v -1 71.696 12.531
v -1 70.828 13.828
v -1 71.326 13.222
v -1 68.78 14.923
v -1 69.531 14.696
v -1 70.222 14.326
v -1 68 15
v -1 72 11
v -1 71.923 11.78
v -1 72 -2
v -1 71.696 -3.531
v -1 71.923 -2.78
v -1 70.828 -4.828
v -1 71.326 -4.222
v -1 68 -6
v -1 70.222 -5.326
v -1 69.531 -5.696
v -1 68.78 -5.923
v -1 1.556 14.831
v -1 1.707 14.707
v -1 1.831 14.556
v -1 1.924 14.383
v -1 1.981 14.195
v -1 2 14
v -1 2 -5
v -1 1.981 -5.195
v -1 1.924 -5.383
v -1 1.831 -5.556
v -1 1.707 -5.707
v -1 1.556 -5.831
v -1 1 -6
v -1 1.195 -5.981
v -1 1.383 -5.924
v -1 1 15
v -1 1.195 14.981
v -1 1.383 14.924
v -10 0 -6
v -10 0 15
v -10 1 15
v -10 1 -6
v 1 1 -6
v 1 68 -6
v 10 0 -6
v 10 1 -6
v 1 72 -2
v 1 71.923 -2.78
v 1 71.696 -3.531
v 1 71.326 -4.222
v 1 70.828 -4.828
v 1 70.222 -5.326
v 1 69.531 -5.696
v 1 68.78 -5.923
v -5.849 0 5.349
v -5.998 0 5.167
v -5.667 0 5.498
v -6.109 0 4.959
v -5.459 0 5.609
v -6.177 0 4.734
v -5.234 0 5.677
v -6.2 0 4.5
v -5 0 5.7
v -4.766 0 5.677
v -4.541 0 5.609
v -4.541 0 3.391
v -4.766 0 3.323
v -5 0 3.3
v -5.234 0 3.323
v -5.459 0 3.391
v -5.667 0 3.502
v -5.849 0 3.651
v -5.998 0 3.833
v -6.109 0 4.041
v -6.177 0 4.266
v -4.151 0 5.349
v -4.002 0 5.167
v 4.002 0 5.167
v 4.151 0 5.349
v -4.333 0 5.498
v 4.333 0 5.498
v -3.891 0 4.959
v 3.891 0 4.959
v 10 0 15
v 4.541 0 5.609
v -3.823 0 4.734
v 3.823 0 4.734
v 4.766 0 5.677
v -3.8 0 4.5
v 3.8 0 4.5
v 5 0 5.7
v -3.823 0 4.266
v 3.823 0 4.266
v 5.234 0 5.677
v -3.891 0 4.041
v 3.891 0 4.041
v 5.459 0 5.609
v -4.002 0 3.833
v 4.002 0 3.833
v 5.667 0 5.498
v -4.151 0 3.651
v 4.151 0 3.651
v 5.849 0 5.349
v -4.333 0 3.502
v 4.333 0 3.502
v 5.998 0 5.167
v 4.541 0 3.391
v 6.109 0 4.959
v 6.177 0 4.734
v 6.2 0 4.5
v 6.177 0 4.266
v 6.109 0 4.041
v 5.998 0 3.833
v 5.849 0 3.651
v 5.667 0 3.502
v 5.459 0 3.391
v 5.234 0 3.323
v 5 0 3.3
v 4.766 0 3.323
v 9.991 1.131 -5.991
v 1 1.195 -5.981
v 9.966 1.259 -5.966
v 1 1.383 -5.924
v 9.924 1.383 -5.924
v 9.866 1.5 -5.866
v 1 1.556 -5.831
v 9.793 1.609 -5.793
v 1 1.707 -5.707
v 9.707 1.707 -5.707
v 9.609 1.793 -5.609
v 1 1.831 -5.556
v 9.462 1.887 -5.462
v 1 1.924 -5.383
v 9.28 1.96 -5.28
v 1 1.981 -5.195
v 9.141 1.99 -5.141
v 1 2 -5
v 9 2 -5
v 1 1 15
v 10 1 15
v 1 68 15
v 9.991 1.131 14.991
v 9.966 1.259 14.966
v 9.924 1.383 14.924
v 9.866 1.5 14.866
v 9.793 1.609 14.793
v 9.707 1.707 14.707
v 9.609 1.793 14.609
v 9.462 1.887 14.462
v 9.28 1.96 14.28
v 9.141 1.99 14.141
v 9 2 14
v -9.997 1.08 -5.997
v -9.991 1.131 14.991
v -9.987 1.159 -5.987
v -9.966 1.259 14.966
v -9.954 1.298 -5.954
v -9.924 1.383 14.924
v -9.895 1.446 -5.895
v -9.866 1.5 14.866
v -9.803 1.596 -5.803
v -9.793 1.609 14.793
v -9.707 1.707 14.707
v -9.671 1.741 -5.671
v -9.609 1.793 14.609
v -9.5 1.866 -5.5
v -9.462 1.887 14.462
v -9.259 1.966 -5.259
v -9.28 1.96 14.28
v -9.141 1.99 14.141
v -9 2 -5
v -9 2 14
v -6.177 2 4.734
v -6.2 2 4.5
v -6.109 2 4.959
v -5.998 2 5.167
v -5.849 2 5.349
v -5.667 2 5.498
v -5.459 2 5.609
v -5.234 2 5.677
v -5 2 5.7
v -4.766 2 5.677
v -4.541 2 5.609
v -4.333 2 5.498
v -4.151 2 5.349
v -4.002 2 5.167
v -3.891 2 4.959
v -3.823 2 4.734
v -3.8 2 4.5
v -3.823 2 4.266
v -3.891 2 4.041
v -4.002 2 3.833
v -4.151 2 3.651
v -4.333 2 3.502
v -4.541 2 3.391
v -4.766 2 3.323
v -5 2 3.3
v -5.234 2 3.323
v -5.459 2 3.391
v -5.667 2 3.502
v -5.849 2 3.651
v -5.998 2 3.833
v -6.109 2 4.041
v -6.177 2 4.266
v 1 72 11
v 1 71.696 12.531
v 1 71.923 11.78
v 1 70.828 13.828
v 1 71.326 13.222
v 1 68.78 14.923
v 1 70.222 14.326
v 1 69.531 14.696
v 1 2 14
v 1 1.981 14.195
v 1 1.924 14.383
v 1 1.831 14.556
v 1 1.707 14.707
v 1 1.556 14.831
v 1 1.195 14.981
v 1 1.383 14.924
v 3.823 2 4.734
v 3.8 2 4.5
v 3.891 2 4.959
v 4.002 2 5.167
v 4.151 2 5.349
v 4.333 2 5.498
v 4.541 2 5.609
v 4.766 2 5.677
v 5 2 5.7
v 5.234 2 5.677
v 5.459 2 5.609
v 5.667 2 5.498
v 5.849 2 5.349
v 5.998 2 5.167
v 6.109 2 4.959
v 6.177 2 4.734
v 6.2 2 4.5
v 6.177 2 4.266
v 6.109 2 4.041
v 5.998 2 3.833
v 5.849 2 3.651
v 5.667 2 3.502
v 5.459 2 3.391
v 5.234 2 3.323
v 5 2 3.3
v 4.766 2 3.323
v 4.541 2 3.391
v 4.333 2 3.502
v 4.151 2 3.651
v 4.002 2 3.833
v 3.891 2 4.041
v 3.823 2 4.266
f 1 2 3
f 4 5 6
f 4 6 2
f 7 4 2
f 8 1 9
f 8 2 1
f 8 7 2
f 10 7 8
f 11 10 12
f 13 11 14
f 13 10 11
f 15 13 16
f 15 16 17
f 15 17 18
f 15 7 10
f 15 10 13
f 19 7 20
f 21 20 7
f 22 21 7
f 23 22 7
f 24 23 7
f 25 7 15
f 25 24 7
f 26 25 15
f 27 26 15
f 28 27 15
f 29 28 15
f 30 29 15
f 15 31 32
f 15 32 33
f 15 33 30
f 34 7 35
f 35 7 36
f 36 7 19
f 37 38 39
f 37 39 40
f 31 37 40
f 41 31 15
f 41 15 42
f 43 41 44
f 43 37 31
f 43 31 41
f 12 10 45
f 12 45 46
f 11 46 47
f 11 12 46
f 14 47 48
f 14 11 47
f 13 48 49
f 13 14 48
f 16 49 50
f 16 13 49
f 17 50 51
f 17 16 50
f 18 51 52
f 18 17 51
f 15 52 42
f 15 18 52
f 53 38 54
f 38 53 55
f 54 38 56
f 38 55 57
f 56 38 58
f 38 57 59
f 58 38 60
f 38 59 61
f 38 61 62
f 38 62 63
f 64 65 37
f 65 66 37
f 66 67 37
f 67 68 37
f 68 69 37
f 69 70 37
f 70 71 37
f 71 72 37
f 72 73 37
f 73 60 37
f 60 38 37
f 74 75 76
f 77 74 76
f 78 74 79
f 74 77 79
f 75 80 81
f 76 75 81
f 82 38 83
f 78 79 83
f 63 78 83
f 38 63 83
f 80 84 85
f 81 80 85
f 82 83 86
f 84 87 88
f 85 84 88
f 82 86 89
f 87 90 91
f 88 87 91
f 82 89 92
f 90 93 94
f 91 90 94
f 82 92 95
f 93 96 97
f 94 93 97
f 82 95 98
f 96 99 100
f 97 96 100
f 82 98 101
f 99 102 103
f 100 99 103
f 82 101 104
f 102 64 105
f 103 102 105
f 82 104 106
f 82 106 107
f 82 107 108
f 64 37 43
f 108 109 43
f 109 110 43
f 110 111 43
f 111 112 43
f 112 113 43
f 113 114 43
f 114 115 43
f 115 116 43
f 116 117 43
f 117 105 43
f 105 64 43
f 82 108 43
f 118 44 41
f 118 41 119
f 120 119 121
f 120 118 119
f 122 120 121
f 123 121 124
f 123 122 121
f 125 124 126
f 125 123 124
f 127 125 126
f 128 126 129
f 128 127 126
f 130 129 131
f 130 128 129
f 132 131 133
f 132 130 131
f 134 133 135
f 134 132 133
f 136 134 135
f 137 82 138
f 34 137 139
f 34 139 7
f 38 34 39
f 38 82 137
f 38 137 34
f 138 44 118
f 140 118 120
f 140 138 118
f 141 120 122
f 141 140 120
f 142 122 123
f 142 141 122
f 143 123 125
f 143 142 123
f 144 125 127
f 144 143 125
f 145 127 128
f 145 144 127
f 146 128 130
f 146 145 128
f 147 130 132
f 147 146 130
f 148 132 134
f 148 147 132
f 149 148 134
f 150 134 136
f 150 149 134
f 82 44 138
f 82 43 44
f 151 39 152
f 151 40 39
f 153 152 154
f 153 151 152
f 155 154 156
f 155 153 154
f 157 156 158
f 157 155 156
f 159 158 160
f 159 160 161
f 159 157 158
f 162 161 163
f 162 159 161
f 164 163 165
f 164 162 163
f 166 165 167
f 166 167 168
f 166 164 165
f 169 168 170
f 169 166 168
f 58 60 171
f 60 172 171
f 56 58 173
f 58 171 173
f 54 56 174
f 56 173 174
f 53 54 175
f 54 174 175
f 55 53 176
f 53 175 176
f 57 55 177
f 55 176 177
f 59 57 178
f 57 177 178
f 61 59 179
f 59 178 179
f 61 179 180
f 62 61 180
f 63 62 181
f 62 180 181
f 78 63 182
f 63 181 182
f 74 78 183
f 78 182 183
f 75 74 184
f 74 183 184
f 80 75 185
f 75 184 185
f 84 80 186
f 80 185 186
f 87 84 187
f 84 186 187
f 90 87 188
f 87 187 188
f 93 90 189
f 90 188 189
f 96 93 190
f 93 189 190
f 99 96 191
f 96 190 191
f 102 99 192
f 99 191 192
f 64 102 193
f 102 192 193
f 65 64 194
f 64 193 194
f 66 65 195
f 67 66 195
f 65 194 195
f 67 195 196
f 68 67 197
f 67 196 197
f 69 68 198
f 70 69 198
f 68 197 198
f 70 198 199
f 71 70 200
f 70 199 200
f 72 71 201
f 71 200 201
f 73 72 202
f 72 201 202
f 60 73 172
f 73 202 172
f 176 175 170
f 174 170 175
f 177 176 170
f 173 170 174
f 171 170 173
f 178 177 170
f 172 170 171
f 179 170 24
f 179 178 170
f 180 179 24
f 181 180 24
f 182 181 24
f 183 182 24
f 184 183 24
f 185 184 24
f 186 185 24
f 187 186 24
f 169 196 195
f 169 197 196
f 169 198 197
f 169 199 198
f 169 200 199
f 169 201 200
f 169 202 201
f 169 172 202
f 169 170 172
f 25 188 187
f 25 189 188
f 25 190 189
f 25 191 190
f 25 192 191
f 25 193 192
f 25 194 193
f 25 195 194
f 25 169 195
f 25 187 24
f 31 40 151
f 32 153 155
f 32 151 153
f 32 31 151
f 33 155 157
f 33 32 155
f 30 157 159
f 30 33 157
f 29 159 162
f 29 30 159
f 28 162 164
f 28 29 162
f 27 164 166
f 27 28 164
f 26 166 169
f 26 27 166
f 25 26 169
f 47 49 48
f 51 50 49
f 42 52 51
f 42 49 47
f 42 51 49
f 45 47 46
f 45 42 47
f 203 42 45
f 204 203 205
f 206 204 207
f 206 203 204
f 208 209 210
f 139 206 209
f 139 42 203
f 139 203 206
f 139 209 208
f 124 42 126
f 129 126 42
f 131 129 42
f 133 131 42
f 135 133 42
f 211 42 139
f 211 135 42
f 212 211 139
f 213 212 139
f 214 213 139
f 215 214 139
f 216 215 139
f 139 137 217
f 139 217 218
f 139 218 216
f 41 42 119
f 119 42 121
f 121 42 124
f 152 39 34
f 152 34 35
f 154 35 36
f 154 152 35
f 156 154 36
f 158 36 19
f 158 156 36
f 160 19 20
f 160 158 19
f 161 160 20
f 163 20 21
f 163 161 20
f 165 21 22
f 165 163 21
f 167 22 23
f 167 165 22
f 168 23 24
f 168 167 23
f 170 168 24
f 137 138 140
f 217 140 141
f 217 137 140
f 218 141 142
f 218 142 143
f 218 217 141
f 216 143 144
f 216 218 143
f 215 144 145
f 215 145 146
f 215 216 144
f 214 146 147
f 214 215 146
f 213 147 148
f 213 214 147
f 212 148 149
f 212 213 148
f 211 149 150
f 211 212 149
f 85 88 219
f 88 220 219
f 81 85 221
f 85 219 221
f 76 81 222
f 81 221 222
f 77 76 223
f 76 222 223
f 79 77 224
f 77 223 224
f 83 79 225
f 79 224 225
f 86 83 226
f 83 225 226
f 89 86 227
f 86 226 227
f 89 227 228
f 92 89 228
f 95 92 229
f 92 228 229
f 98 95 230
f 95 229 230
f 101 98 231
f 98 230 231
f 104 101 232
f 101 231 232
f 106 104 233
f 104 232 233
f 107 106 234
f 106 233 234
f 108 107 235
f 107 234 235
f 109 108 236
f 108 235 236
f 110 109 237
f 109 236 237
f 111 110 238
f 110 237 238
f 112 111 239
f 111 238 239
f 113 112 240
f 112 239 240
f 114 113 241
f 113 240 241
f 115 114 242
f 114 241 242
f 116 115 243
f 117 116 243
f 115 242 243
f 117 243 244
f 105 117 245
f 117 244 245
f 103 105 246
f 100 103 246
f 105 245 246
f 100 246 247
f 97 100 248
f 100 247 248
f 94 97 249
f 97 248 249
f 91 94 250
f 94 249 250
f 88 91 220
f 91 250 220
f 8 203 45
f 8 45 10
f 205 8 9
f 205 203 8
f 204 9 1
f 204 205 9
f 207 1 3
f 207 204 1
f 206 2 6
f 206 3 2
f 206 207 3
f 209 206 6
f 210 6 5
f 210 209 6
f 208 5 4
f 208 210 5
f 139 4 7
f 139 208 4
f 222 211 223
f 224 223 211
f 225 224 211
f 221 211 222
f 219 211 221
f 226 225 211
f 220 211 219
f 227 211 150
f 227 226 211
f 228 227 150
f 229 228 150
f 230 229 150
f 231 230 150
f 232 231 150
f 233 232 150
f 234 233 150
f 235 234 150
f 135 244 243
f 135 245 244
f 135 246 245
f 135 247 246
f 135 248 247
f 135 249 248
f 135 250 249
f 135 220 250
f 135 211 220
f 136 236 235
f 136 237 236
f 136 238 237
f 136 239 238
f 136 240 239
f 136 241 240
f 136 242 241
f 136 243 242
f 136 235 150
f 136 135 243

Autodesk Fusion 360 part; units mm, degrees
sketch "Sketch1" plane through (0, 0, 0) normal (0, 1, 0) x (1, 0, 0)
  line L0 (10, -15) -> (-10, -15)
  line L1 (-10, -15) -> (-10, 6)
  line L2 (-10, 6) -> (10, 6)
  line L3 (10, 6) -> (10, -15)
  dimension "d1" = 21
  dimension "d2" = 20
extrude "Extrude1" add sketch "Sketch1" along normal blind 2
sketch "Sketch2" plane through (0, 2, 0) normal (0, 1, 0) x (-1, 0, 0)
  line L0 (-10, -6) -> (10, -6)
  line L1 (10, -6) -> (10, 15)
  line L2 (10, 15) -> (-10, 15)
  line L3 (-10, 15) -> (-10, -6)
  line L4 (-1, 15) -> (1, 15)
  line L5 (1, 15) -> (1, -6)
  line L6 (1, -6) -> (-1, -6)
  line L7 (-1, -6) -> (-1, 15)
  dimension "d5" = 2
  dimension "d6" = 9
extrude "Extrude2" add sketch "Sketch2" along normal blind 70 contours L0 L2 L4 L5 L6 L7
sketch "Sketch3" plane through (0, 2, 0) normal (0, 1, 0) x (-1, 0, 0)
  line L0 (-1, -6) -> (-1, 15)
  line L1 (-1, 15) -> (-10, 15)
  line L2 (-10, 15) -> (-10, -6)
  line L3 (-10, -6) -> (-1, -6)
  circle A0 centre (-5, 4.5) radius 1.2
  circle A1 centre (5, 4.5) radius 1.2
  line L4 (10, 15) -> (1, 15)
  dimension "d9" = 2.4
  dimension "d10" = 2.4
  dimension "d11" = 10.5
  dimension "d12" = 10.5
  dimension "d19" = 10
extrude "Extrude3" cut sketch "Sketch3" against normal blind 2 contours A0 | A1
fillet "Fillet1" radius 1 6 edges at (10, 2, 4.5) (5.5, 2, 15) (-5.5, 2, 15) (-10, 2, 4.5) (-5.5, 2, -6) (5.5, 2, -6)
fillet "Fillet2" radius 4 2 edges at (0, 72, 15) (0, 72, -6)
